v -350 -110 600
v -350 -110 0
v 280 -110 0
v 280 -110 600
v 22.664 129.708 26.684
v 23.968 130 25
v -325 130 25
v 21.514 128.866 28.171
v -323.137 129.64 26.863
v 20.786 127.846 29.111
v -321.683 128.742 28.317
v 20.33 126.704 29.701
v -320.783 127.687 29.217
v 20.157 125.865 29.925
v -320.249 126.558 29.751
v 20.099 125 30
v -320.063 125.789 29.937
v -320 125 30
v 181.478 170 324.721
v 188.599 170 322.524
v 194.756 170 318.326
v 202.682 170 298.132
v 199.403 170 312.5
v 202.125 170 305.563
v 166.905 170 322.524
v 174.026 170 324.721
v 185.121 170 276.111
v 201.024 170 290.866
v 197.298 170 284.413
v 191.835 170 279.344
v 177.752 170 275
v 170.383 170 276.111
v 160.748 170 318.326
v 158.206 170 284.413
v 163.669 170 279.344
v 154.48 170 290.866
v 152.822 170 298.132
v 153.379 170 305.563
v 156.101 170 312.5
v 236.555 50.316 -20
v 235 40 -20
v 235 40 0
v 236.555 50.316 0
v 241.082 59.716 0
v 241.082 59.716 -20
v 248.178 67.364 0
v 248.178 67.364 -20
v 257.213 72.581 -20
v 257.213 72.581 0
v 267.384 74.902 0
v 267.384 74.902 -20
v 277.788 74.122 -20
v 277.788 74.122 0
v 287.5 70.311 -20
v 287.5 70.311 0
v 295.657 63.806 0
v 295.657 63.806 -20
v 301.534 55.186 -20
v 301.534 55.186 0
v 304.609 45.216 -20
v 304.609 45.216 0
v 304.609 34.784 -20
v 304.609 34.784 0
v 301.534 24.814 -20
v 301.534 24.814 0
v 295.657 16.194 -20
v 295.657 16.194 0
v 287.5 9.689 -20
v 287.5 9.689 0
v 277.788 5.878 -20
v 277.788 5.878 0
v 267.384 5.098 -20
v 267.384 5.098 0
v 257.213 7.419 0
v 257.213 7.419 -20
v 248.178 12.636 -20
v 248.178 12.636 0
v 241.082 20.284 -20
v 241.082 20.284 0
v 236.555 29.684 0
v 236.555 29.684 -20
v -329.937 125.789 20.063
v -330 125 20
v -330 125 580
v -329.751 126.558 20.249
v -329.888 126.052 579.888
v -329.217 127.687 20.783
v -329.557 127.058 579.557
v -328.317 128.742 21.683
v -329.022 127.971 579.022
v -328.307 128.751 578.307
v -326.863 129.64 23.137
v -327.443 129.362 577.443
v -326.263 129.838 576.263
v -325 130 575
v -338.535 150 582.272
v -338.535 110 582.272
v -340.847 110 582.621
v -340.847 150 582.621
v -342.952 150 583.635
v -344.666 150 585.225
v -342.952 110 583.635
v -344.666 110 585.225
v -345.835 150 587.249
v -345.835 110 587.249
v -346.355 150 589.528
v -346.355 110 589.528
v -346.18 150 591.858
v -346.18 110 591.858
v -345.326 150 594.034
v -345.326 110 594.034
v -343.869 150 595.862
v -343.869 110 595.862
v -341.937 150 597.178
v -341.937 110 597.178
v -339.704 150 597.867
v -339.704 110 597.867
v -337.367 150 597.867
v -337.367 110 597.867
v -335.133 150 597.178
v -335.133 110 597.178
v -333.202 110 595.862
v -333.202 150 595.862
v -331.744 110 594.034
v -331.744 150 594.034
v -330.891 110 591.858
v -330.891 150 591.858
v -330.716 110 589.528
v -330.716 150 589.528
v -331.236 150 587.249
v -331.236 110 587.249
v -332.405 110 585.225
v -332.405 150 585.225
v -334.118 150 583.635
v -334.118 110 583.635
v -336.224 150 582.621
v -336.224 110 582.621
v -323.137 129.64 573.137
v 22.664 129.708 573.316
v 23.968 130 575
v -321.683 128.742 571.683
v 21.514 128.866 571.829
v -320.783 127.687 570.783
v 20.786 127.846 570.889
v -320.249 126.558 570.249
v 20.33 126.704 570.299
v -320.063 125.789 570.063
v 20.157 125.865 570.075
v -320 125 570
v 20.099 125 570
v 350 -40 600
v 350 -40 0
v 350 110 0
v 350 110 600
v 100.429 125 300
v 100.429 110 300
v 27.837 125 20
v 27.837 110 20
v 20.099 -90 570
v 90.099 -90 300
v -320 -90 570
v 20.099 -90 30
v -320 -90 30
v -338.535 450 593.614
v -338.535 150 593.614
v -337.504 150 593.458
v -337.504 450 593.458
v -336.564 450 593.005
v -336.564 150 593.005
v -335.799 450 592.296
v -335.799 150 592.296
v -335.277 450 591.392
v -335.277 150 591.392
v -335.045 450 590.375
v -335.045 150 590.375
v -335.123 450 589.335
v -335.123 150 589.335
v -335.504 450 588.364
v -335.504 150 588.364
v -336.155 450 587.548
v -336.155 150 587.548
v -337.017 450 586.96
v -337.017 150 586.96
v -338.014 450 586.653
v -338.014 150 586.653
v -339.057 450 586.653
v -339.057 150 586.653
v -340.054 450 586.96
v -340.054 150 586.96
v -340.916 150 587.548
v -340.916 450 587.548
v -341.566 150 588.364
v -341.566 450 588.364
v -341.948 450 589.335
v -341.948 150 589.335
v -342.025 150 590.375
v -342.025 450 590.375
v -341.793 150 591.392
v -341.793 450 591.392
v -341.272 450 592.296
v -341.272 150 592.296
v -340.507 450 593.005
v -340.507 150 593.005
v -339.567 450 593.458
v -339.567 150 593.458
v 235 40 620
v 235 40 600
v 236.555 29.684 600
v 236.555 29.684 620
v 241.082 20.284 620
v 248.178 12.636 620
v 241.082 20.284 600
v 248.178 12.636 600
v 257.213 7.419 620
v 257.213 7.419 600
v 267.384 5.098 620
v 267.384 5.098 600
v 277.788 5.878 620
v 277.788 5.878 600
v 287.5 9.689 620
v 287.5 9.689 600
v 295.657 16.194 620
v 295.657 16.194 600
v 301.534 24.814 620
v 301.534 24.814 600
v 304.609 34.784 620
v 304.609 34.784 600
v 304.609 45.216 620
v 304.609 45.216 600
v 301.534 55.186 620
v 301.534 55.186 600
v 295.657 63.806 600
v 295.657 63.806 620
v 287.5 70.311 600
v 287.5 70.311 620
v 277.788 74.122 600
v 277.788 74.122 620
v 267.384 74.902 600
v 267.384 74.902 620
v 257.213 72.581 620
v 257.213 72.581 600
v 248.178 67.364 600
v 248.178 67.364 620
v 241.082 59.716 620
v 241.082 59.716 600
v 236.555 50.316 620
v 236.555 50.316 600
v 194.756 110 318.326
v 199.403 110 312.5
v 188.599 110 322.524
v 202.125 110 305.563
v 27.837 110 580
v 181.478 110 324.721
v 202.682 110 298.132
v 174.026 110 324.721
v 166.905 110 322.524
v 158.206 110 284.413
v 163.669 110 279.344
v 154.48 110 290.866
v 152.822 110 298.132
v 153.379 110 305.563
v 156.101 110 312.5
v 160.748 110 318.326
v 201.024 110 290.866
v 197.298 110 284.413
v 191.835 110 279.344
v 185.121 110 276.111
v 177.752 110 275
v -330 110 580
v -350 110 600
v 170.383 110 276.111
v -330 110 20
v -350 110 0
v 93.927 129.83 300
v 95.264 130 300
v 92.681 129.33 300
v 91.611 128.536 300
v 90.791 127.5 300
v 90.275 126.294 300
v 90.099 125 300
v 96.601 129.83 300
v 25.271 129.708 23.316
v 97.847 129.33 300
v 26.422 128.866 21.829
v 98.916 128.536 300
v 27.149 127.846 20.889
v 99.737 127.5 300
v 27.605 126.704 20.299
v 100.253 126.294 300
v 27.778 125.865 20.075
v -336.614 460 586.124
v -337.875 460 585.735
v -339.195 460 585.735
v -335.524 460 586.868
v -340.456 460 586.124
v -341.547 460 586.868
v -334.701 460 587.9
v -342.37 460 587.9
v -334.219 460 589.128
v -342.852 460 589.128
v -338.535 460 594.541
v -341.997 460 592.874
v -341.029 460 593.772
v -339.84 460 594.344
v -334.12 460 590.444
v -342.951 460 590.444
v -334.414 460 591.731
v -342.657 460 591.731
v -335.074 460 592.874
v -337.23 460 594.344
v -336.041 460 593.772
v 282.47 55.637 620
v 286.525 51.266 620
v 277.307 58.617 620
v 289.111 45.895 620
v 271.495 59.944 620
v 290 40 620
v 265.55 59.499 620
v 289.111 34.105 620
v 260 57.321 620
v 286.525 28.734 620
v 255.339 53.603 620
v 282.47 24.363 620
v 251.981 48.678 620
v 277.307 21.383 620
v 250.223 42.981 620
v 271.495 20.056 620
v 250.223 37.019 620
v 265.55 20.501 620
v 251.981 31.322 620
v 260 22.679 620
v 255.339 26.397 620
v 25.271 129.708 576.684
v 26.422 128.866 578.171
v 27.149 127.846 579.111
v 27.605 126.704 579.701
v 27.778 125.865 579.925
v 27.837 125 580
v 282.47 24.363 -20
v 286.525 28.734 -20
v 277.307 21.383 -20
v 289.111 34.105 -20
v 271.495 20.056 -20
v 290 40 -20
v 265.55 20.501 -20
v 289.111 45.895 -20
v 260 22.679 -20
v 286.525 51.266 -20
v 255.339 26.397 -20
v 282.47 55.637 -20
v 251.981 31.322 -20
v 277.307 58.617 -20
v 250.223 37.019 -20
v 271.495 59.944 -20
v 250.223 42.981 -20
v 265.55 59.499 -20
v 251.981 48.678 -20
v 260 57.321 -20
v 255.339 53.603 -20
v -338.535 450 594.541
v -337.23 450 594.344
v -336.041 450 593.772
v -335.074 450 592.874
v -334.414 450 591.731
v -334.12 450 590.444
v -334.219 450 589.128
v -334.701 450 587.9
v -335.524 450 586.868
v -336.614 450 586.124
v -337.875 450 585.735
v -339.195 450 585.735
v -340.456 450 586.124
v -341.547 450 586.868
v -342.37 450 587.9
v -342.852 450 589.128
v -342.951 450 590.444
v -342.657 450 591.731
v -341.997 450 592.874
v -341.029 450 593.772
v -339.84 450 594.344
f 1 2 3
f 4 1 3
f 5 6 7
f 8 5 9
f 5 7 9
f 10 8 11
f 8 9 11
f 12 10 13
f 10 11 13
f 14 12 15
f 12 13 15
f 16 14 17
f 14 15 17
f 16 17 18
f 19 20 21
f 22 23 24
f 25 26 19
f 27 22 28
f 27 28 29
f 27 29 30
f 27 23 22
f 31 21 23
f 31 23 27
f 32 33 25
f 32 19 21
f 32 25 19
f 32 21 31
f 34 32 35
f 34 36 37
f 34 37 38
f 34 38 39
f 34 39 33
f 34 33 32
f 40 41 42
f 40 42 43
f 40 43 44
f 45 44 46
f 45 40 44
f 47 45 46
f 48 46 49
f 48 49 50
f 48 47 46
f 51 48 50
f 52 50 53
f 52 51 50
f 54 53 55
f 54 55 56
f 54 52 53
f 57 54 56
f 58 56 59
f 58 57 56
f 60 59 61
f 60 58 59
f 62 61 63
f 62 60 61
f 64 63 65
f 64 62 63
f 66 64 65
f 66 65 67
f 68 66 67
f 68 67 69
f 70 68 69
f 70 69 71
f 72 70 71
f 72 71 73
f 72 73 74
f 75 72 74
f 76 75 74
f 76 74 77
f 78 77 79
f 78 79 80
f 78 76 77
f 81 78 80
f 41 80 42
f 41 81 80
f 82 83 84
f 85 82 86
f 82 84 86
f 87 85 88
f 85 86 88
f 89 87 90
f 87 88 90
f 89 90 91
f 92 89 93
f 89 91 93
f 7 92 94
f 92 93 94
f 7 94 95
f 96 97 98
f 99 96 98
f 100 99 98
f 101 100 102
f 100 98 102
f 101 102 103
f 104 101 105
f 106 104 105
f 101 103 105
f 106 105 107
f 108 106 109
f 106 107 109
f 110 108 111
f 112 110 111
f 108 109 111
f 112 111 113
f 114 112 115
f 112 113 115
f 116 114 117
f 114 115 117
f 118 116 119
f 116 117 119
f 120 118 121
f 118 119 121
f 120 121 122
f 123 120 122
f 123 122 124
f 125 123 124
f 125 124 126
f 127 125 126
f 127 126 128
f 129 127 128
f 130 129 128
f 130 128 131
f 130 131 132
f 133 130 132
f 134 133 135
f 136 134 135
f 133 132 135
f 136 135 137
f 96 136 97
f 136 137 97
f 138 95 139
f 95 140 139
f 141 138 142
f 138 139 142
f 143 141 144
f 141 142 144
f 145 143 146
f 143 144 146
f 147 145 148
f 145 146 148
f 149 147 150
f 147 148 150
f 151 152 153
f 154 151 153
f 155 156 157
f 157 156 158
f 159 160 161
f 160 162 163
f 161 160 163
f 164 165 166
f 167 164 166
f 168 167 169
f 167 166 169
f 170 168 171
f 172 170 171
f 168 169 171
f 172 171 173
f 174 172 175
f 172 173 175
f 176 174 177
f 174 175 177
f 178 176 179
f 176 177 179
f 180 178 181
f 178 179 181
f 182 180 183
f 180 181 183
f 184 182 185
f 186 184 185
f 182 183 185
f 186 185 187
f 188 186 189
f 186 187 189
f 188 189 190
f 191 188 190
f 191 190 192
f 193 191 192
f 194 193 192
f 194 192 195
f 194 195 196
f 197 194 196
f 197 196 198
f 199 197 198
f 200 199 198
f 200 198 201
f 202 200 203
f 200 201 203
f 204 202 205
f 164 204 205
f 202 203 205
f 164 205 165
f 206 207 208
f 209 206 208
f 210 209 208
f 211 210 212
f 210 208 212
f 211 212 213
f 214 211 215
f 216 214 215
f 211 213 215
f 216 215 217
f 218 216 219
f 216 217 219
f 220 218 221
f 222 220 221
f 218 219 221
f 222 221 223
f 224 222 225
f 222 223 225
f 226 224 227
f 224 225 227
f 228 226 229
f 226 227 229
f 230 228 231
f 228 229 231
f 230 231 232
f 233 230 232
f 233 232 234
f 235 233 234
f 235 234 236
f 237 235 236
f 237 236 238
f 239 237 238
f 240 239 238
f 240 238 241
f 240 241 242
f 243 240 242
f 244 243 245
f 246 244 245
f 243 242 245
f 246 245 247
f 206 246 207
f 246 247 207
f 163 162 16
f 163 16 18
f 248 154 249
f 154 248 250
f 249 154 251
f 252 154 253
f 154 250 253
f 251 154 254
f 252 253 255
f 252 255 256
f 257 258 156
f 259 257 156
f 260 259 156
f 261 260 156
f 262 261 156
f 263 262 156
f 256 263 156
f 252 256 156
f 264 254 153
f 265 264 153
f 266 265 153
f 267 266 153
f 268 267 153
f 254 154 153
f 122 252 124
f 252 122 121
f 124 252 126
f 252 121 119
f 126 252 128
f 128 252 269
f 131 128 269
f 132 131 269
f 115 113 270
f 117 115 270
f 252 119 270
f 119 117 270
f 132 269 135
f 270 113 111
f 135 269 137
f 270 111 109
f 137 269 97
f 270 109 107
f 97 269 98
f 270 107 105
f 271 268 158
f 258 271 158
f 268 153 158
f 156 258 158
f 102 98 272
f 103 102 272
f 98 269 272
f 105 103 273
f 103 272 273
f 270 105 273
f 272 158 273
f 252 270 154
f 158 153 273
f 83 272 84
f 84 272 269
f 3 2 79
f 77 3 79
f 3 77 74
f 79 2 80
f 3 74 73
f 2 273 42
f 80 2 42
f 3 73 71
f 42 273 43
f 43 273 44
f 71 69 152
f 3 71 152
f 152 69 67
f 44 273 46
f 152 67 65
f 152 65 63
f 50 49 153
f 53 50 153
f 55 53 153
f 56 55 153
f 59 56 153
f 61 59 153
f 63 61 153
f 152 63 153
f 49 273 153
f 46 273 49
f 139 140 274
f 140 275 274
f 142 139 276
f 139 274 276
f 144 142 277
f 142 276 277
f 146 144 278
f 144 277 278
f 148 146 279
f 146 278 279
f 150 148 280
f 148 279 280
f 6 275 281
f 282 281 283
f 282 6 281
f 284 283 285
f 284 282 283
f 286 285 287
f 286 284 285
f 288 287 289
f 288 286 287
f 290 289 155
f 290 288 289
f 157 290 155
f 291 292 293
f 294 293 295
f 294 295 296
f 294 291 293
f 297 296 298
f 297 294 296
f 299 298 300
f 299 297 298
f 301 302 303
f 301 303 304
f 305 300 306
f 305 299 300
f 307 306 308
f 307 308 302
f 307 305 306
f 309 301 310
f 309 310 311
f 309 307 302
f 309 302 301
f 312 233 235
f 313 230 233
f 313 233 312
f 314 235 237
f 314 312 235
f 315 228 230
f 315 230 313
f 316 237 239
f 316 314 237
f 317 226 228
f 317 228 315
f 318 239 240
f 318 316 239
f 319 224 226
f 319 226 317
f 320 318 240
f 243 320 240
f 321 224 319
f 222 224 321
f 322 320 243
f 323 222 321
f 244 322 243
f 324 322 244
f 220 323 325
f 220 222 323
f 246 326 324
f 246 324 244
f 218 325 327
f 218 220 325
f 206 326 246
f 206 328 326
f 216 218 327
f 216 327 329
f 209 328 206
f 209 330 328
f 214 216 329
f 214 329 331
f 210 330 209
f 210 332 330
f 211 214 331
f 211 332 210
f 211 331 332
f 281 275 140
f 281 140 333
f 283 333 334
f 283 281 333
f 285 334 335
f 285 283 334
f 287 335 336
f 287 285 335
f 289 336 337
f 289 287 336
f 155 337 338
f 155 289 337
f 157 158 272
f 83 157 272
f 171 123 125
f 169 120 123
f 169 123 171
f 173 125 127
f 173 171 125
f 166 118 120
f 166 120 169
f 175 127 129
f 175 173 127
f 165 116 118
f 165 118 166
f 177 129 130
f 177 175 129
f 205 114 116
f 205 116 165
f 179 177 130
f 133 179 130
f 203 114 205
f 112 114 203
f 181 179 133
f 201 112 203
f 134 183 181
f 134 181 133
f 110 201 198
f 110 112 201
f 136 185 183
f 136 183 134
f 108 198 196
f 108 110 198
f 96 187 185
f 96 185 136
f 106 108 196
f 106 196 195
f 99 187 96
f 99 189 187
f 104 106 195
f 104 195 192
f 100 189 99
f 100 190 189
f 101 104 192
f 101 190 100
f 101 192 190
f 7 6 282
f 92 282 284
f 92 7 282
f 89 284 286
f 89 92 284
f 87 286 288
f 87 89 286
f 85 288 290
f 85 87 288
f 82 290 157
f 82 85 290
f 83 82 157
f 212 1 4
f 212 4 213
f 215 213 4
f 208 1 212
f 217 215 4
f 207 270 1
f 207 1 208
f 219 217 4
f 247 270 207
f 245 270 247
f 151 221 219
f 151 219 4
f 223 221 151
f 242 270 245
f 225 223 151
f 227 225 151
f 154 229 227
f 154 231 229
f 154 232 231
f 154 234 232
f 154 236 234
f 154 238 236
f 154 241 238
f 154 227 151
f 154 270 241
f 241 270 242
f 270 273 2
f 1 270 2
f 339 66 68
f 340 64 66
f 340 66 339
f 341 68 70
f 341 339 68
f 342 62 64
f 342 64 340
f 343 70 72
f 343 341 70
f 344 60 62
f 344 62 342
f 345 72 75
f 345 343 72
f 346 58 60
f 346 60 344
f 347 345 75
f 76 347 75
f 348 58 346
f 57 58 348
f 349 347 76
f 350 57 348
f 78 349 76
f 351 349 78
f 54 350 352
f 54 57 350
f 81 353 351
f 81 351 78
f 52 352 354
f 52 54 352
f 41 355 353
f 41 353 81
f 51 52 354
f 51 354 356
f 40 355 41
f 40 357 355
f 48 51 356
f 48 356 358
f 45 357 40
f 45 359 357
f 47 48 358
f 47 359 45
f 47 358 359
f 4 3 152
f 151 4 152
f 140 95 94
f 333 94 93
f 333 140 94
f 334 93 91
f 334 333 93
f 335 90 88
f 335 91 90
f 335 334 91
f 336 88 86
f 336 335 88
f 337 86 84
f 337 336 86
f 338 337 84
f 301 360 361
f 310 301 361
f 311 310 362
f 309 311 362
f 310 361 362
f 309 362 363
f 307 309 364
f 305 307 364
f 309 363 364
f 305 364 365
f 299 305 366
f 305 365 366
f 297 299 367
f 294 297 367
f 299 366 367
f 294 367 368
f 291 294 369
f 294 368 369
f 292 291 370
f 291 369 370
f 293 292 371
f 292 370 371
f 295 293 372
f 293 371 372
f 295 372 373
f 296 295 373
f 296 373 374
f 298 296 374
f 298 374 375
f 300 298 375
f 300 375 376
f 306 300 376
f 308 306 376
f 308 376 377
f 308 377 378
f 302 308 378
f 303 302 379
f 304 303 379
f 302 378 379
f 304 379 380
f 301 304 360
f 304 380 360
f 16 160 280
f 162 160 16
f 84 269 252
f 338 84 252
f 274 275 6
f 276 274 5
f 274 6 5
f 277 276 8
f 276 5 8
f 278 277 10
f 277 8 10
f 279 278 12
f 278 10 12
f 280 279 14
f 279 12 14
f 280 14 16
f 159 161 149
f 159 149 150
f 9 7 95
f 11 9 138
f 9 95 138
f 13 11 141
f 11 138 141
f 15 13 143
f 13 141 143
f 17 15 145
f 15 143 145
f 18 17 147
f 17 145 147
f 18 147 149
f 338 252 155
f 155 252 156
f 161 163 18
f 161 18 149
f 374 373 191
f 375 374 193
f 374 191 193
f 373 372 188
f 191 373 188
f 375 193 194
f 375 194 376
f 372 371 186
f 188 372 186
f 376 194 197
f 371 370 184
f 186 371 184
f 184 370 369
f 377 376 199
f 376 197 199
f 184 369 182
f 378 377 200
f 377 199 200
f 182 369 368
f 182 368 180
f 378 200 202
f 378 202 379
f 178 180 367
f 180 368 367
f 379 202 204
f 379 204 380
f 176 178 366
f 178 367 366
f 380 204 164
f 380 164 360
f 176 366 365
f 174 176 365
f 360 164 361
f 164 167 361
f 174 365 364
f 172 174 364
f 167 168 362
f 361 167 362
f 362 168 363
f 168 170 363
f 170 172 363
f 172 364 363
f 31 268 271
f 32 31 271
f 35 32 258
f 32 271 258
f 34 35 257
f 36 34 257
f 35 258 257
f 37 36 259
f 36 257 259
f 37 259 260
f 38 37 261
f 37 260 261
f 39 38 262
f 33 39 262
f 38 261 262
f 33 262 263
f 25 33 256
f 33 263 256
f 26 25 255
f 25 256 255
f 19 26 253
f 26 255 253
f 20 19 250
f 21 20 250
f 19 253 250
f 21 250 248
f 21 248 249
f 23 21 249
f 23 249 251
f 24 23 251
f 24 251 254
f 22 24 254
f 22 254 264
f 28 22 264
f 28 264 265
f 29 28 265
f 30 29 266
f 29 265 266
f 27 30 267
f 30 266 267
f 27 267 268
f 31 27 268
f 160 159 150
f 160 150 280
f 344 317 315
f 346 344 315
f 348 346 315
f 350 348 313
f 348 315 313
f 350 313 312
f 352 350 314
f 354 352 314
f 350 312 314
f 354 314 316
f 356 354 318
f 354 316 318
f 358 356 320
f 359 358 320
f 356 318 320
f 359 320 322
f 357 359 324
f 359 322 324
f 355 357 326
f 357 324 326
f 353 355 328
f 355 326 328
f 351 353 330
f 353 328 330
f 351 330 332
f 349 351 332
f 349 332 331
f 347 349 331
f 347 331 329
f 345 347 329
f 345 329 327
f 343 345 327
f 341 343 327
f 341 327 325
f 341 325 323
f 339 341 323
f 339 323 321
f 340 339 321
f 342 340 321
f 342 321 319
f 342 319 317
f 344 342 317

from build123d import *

# Parameters (mm, degrees)
BOSS_EXTRUDE1_DEPTH = 600
CUT_EXTRUDE1_DEPTH  = 200
BOSS_EXTRUDE2_DEPTH = 20
FILLET1_R           = 5
SKETCH4_R           = 35
BOSS_EXTRUDE3_DEPTH = 20
BOSS_EXTRUDE4_START = 20
SKETCH5_R           = 35
BOSS_EXTRUDE4_DEPTH = 20
SKETCH6_R           = 10
CUT_EXTRUDE2_DEPTH  = 741.945342114
SKETCH7_R           = 25
BOSS_EXTRUDE5_DEPTH = 60
SKETCH9_R           = 20
CUT_EXTRUDE3_DEPTH  = 749.999332443
SKETCH10_R          = 7.841324839
BOSS_EXTRUDE6_DEPTH = 40
SKETCH11_R          = 3.5
BOSS_EXTRUDE7_DEPTH = 300
SKETCH12_R          = 4.427649499
BOSS_EXTRUDE8_DEPTH = 10


with BuildPart() as part:
    # Sketch1 → Boss-Extrude1 (new body)
    with BuildSketch(Plane.XY):
        Polygon((280, -110), (350, -40), (350, 110), (-350, 110), (-350, -110), align=None)
    extrude(amount=BOSS_EXTRUDE1_DEPTH)

    # Sketch2 → Cut-Extrude1 (cut)
    with BuildSketch(Plane(origin=(0, 110, 0), x_dir=(1, 0, 0), z_dir=(0, 1, 0))):
        Polygon((20.098635598, -30), (90.098635598, -300), (20.098635598, -570), (-320, -570), (-320, -30), align=None)
    extrude(amount=-CUT_EXTRUDE1_DEPTH, mode=Mode.SUBTRACT)

    # Sketch3 → Boss-Extrude2 (add)
    with BuildSketch(Plane(origin=(0, 110, 0), x_dir=(1, 0, 0), z_dir=(0, 1, 0))):
        Polygon((-330, -20), (-330, -580), (27.836654621, -580), (100.429247214, -300), (27.836654621, -20), align=None)
        Polygon((-320, -30), (-320, -570), (20.098635598, -570), (90.098635598, -300), (20.098635598, -30), align=None, mode=Mode.SUBTRACT)
    extrude(amount=BOSS_EXTRUDE2_DEPTH)

    # Fillet1
    fillet1_edges = [part.edges().sort_by_distance(p)[0] for p in [
        (-151.081672689, 130, 20),
        (-330, 130, 300),
        (-151.081672689, 130, 580),
        (64.132950917, 130, 440),
        (64.132950917, 130, 160),
        (-149.950682201, 130, 30),
        (-320, 130, 300),
        (-149.950682201, 130, 570),
        (55.098635598, 130, 435),
        (55.098635598, 130, 165),
    ]]
    fillet(fillet1_edges, radius=FILLET1_R - 0.0001)  # a hair under: the kernel refuses the full size

    # Sketch4 → Boss-Extrude3 (add)
    with BuildSketch(Plane.XY.offset(600)):
        with Locations(Location((270, 40, 0), (0, 0, 180))):
            Circle(SKETCH4_R)
    extrude(amount=BOSS_EXTRUDE3_DEPTH)

    # Sketch5 → Boss-Extrude4 (add)
    with BuildSketch(Plane(origin=(0, 0, 0), x_dir=(-1, 0, 0), z_dir=(0, 0, -1)).offset(BOSS_EXTRUDE4_START)):
        with Locations((-270, 40)):
            Circle(SKETCH5_R)
    extrude(amount=-BOSS_EXTRUDE4_DEPTH)

    # Sketch6 → Cut-Extrude2 (cut, through all)
    with BuildSketch(Plane.XY.offset(620)):
        with Locations((270, 40)):
            Circle(SKETCH6_R)
    extrude(amount=-CUT_EXTRUDE2_DEPTH, mode=Mode.SUBTRACT)

    # Sketch7 → Boss-Extrude5 (add)
    with BuildSketch(Plane(origin=(0, 110, 0), x_dir=(1, 0, 0), z_dir=(0, 1, 0))):
        with Locations(Location((177.752116484, -300, 0), (0, 0, 90))):
            Circle(SKETCH7_R)
    extrude(amount=BOSS_EXTRUDE5_DEPTH)

    # Sketch9 → Cut-Extrude3 (cut, through all)
    with BuildSketch(Plane.XY.offset(620)):
        with Locations((270, 40)):
            Circle(SKETCH9_R)
    extrude(amount=-CUT_EXTRUDE3_DEPTH, mode=Mode.SUBTRACT)

    # Sketch10 → Boss-Extrude6 (add)
    with BuildSketch(Plane(origin=(0, 110, 0), x_dir=(1, 0, 0), z_dir=(0, 1, 0))):
        with Locations(Location((-338.53526131, -590.113534013, 0), (0, 0, 90))):
            Circle(SKETCH10_R)
    extrude(amount=BOSS_EXTRUDE6_DEPTH)

    # Sketch11 → Boss-Extrude7 (add)
    with BuildSketch(Plane(origin=(0, 150, 0), x_dir=(1, 0, 0), z_dir=(0, 1, 0))):
        with Locations(Location((-338.53526131, -590.113534013, 0), (0, 0, 270))):
            Circle(SKETCH11_R)
    extrude(amount=BOSS_EXTRUDE7_DEPTH)

    # Sketch12 → Boss-Extrude8 (add)
    with BuildSketch(Plane(origin=(0, 450, 0), x_dir=(1, 0, 0), z_dir=(0, 1, 0))):
        with Locations(Location((-338.53526131, -590.113534013, 0), (0, 0, 270))):
            Circle(SKETCH12_R)
    extrude(amount=BOSS_EXTRUDE8_DEPTH)


solid = part.part
